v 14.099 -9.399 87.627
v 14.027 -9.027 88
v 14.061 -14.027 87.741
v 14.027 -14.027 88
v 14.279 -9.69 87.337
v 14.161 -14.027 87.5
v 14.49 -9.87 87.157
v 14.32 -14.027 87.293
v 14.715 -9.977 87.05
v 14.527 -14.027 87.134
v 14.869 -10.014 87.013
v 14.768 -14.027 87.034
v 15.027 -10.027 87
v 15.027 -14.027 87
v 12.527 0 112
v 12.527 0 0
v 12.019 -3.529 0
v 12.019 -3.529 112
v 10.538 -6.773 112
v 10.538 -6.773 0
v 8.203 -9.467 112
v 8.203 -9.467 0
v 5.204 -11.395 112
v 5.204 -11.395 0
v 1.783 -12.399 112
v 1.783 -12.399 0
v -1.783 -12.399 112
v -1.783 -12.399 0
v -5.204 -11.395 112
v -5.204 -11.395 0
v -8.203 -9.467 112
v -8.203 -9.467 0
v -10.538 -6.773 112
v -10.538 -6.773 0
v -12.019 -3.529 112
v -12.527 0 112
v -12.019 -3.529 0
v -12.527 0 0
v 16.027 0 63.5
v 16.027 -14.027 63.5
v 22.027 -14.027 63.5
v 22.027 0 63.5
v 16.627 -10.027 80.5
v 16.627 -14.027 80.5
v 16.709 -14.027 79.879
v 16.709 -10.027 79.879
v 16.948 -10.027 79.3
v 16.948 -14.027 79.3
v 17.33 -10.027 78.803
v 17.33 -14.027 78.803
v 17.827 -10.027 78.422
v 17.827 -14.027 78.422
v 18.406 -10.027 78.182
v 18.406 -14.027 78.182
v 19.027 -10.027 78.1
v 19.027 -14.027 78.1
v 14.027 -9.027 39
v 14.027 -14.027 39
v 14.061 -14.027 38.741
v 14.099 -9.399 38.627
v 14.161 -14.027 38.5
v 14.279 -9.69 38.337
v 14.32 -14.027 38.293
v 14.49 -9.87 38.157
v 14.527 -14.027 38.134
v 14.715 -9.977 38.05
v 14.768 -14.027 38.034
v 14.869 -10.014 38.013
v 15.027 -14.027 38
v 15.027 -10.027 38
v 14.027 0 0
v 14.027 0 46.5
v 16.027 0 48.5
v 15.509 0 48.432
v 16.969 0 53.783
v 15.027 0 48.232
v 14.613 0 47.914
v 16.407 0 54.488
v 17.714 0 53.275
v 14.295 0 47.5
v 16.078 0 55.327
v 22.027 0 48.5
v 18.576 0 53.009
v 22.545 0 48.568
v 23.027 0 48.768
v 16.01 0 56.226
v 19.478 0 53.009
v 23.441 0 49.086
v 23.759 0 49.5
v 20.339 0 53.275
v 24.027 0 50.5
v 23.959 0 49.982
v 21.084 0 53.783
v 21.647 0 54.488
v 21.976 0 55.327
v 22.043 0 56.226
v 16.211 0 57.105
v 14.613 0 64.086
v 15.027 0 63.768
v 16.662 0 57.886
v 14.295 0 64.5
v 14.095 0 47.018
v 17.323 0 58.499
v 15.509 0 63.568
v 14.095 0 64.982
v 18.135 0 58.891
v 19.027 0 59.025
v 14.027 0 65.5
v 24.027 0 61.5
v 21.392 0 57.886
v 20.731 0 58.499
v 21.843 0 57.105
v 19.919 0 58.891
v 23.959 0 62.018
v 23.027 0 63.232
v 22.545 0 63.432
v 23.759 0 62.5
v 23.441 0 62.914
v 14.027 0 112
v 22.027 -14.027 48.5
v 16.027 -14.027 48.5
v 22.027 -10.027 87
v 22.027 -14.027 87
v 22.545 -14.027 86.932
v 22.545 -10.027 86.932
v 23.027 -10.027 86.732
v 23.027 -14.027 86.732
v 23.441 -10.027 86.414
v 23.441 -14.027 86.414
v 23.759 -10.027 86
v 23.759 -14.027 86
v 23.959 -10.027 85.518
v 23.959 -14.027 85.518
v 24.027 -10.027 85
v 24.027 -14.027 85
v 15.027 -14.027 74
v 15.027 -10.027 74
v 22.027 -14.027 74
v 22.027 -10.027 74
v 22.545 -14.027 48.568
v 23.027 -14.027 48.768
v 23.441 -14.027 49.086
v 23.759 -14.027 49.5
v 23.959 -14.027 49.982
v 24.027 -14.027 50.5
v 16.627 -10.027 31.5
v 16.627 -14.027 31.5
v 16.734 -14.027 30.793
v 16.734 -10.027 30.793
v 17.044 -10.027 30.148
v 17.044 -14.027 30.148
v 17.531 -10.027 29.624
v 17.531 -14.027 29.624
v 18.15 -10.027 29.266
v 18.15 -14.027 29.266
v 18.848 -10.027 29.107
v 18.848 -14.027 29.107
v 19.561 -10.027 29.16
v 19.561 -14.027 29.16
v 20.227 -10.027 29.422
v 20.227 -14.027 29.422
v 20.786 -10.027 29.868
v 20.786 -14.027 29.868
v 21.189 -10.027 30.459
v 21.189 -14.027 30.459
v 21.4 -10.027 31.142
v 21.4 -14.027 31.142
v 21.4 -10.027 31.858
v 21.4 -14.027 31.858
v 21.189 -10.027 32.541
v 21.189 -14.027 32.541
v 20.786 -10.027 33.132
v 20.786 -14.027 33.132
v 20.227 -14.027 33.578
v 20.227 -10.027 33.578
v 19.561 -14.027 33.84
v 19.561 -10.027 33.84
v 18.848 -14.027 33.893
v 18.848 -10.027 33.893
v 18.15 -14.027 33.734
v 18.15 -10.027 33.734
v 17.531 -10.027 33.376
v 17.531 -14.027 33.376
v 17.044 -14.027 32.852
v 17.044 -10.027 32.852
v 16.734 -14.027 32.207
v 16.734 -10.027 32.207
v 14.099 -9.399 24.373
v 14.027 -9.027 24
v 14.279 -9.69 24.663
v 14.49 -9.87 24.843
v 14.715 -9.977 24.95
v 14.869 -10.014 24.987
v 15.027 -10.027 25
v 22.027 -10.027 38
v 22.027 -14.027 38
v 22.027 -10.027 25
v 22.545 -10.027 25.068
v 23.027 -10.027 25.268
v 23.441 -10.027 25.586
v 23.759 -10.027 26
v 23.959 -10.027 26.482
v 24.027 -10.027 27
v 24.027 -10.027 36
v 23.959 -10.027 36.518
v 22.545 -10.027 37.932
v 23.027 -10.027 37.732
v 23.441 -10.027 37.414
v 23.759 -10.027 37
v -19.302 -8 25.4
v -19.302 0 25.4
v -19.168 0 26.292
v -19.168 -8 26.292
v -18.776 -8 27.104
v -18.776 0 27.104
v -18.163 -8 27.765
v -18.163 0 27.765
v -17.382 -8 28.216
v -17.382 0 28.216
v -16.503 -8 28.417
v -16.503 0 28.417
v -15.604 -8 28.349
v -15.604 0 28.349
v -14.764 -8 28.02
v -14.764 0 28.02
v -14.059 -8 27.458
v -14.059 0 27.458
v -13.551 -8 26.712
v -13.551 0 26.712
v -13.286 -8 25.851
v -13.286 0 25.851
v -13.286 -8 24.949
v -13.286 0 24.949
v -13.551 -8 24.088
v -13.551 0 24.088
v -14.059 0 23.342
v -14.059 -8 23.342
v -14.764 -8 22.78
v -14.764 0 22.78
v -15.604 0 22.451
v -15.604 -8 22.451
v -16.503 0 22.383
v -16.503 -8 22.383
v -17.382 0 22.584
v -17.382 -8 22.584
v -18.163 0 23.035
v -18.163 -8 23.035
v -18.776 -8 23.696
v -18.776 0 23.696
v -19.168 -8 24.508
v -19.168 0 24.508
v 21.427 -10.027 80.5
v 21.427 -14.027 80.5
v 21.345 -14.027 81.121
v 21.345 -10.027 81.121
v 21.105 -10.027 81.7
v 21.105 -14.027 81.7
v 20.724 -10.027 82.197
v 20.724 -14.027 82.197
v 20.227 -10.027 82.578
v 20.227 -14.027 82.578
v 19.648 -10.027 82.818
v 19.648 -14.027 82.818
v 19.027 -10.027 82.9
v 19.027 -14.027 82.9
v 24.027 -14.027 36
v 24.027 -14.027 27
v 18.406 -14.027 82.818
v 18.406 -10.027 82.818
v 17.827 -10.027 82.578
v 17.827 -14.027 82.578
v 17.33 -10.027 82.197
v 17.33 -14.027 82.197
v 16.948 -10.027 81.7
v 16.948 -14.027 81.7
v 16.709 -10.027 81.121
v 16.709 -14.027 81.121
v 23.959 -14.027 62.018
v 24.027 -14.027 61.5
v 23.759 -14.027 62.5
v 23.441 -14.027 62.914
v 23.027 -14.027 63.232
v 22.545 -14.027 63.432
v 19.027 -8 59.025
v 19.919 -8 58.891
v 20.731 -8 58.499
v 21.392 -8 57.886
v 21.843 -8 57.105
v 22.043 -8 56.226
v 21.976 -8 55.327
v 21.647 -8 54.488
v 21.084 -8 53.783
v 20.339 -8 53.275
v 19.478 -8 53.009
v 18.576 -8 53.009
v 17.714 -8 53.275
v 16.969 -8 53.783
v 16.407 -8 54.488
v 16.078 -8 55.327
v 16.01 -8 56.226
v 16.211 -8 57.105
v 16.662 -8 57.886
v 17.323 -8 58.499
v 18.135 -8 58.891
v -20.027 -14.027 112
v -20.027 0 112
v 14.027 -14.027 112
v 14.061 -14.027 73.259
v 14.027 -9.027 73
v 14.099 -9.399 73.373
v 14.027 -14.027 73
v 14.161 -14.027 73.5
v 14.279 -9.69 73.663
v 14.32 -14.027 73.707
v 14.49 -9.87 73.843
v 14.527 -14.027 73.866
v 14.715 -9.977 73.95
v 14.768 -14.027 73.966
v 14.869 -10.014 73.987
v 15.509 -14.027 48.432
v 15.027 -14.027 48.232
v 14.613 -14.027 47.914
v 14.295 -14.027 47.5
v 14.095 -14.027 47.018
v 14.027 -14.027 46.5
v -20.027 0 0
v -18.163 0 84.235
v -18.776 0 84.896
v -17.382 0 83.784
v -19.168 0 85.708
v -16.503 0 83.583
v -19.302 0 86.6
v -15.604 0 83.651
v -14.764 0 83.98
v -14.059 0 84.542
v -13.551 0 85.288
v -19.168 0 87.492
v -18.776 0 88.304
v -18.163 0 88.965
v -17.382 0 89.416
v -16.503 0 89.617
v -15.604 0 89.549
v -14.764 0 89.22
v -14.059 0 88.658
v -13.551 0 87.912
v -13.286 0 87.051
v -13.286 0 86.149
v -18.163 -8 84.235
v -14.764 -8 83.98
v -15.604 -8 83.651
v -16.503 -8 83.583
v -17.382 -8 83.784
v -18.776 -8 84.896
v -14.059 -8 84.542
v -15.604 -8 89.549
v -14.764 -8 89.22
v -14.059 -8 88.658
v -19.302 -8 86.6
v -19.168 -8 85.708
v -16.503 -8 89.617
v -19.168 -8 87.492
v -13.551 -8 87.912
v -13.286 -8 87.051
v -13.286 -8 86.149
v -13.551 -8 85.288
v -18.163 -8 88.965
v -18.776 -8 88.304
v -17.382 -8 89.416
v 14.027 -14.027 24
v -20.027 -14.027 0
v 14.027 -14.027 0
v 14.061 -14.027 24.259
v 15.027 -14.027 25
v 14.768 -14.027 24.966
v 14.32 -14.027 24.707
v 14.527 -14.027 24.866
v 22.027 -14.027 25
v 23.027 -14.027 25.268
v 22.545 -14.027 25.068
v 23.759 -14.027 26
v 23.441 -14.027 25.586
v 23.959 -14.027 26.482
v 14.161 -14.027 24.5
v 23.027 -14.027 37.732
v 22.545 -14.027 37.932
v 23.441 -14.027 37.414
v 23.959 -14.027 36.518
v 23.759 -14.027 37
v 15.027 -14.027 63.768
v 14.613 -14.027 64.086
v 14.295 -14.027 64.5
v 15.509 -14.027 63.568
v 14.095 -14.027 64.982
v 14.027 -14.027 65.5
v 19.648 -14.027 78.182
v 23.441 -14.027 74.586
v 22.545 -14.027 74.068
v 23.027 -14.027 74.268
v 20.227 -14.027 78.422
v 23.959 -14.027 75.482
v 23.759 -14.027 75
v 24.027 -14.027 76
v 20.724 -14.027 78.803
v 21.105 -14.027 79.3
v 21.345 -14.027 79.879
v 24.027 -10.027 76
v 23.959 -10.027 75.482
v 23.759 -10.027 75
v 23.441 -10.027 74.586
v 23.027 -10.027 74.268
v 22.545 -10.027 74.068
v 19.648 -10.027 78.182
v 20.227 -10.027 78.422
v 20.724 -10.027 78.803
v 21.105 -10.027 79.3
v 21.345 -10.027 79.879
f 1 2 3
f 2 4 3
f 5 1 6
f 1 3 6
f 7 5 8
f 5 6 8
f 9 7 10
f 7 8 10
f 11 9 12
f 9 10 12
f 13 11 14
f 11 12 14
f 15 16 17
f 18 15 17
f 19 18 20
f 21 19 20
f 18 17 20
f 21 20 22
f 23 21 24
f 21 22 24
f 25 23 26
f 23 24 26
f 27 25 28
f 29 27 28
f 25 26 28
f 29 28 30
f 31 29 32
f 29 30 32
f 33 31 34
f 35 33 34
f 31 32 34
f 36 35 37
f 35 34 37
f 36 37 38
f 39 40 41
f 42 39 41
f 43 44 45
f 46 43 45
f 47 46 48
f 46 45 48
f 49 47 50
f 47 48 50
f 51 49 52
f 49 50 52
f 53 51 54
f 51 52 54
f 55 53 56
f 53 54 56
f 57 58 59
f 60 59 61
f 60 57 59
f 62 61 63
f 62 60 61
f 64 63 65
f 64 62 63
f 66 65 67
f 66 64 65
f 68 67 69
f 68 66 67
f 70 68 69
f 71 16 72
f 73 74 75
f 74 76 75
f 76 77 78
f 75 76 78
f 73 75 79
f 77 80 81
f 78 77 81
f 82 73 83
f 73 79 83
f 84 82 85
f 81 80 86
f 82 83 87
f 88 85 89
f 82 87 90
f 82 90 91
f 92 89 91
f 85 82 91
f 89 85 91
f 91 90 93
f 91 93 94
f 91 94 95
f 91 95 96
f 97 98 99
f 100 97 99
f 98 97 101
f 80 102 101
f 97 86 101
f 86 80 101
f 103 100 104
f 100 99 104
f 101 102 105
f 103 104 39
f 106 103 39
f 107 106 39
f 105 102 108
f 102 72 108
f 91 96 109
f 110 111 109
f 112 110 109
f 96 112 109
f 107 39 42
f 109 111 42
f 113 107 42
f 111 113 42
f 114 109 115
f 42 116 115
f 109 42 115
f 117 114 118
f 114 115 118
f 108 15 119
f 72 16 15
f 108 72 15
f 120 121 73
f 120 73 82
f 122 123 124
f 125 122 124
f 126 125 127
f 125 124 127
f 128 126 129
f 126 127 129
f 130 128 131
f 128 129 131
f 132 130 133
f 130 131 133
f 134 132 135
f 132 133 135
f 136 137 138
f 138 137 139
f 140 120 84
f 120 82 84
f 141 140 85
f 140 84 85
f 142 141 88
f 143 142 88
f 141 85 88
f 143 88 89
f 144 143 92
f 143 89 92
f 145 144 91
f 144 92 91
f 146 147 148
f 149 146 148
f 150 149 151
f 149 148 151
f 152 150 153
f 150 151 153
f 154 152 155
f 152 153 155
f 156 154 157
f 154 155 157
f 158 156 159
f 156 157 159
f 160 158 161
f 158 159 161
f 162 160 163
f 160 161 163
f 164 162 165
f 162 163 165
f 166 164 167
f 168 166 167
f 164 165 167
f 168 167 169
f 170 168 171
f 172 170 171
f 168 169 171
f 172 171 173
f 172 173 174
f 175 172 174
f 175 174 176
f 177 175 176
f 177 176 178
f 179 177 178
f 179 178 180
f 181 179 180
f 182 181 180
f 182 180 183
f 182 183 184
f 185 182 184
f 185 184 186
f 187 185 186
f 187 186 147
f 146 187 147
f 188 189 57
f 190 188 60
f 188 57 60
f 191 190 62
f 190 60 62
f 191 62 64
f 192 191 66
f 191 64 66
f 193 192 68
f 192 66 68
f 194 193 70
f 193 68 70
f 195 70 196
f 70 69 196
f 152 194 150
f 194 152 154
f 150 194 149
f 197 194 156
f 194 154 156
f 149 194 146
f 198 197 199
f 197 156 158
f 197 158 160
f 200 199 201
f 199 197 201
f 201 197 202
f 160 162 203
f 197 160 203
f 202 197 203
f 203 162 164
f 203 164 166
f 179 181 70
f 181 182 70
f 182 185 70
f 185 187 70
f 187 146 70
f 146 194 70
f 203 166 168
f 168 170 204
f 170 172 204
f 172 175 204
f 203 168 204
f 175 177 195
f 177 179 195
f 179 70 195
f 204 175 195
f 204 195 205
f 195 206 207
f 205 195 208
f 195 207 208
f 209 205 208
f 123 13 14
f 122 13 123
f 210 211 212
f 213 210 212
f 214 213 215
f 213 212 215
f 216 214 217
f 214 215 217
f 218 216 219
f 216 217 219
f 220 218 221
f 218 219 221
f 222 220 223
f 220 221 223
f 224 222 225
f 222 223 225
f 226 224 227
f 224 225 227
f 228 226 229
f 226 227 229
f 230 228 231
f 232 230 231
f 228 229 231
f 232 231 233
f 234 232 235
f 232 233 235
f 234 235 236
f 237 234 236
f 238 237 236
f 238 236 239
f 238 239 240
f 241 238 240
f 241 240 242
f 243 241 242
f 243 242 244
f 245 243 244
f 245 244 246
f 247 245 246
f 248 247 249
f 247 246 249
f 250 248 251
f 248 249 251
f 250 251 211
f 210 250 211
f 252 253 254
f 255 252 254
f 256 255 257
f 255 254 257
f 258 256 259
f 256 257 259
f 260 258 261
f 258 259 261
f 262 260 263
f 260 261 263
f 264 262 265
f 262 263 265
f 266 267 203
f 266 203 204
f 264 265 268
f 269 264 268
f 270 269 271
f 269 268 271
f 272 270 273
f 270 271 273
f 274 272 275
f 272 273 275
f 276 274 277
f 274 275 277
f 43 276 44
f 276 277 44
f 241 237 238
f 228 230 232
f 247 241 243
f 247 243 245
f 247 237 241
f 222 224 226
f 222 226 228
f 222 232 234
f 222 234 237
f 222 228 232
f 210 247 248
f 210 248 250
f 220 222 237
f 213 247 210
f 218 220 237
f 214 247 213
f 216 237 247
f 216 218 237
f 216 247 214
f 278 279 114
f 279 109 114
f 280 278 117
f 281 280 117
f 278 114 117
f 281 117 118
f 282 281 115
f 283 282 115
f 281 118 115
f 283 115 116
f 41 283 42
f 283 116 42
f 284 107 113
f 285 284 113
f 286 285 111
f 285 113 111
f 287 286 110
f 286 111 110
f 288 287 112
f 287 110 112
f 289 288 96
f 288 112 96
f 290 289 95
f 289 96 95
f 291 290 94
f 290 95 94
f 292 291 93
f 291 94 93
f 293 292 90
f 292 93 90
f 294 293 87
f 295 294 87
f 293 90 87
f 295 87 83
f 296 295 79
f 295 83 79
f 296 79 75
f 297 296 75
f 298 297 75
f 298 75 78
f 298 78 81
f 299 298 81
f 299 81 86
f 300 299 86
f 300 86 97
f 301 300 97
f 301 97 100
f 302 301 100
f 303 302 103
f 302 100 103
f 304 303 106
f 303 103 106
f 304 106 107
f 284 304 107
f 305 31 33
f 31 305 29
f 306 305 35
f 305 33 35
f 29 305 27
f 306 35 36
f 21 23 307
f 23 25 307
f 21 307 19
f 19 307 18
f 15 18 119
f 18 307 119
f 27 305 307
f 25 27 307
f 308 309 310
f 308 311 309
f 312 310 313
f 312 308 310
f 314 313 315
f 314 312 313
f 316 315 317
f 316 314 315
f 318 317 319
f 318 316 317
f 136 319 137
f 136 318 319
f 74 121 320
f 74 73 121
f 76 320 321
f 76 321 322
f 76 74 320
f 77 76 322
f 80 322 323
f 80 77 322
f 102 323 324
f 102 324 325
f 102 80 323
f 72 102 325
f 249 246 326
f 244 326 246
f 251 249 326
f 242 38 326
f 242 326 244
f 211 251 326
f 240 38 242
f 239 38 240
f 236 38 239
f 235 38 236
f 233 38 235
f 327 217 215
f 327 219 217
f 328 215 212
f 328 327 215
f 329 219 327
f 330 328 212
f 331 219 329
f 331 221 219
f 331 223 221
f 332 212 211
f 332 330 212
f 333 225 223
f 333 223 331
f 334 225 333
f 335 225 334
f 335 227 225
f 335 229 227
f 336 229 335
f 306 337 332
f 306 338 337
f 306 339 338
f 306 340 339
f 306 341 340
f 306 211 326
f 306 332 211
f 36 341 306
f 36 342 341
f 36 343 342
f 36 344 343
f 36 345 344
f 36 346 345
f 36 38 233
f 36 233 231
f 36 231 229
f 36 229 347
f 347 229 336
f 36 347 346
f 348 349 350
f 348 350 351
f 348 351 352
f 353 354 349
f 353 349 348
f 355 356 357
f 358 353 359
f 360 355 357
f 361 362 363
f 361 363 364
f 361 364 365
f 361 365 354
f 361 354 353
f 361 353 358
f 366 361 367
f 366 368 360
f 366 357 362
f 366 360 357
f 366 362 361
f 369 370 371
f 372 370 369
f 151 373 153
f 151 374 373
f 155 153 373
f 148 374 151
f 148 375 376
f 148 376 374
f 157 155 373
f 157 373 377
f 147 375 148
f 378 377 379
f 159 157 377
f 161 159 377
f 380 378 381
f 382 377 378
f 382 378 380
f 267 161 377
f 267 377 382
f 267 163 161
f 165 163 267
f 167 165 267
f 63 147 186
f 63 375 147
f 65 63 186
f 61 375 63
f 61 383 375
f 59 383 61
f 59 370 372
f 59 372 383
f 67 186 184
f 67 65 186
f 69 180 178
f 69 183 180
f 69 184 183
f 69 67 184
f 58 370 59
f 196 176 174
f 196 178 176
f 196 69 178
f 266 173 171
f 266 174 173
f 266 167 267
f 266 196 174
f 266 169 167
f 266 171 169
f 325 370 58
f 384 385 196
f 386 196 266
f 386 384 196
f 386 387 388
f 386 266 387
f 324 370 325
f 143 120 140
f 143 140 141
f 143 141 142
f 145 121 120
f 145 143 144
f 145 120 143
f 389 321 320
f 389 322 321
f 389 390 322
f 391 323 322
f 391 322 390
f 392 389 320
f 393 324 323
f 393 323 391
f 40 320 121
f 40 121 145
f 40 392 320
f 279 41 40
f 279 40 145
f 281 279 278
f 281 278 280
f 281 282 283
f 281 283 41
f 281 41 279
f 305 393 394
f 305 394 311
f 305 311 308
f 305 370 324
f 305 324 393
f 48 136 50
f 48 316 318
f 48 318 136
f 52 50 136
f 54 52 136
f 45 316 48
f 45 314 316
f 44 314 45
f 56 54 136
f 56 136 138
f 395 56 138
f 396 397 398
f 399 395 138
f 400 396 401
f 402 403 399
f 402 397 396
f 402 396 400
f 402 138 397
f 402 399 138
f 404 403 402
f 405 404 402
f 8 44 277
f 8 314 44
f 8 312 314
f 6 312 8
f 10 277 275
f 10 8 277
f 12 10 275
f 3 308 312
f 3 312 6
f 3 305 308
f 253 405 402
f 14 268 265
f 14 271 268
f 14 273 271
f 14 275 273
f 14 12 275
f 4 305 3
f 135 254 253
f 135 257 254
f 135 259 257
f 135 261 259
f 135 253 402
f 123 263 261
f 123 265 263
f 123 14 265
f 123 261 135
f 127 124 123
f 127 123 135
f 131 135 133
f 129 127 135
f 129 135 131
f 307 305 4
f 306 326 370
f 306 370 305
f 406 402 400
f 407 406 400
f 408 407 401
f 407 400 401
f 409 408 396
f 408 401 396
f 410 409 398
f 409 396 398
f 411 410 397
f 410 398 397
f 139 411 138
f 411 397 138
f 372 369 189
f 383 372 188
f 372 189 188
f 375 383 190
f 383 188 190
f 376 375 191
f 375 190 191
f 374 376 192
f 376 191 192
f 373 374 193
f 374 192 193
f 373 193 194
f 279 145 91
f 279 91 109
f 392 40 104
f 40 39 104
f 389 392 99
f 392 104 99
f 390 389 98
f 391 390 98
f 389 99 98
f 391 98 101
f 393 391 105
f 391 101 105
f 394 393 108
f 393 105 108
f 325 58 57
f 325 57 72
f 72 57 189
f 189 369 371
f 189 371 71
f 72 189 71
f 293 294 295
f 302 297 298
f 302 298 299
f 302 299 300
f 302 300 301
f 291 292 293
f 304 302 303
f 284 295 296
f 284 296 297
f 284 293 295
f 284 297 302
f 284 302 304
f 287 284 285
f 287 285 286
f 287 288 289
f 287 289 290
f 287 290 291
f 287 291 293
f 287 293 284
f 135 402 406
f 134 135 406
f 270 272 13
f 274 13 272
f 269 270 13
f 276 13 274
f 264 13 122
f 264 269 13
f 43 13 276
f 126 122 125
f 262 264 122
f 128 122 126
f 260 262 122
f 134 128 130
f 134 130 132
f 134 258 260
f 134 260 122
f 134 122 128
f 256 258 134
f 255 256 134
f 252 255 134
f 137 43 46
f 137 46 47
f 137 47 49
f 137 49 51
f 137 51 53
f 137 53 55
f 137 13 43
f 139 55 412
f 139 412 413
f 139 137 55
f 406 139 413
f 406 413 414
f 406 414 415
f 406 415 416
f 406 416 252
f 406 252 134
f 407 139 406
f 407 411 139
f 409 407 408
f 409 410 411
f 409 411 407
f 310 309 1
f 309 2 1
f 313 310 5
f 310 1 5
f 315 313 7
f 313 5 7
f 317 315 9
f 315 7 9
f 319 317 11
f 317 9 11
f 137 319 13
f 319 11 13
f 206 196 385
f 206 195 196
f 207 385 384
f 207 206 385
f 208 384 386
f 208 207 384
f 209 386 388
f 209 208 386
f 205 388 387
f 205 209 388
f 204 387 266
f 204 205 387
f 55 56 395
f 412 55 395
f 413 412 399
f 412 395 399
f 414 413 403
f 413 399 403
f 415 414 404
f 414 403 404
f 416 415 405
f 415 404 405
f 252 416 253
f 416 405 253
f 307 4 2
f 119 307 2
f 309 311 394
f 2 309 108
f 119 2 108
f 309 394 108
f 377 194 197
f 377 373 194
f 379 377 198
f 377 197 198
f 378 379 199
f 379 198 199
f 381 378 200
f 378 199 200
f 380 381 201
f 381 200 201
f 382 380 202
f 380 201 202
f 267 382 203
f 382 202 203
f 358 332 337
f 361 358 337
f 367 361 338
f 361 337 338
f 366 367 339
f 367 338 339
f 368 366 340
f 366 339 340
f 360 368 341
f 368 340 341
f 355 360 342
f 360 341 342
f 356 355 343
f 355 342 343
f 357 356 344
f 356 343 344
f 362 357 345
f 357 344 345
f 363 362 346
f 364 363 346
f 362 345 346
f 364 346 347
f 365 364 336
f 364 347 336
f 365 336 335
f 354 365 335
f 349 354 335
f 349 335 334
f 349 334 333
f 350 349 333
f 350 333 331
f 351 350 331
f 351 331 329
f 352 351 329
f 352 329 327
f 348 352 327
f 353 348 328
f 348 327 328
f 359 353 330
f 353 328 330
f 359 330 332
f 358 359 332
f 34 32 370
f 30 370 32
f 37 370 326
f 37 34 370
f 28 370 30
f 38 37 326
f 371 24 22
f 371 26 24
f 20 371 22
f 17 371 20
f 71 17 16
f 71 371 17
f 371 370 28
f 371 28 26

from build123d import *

# Parameters (mm, degrees)
BOSS_EXTRUDE1_DEPTH  = 112
SKETCH3_W            = 11
SKETCH3_H            = 11
BOSS_EXTRUDE2_DEPTH  = 4
BOSS_EXTRUDE3_REACH  = 127.251
SKETCH8_W            = 10
SKETCH8_H            = 13
BOSS_EXTRUDE4_DEPTH  = 4
FILLET1_R            = 2
M4_CLEARANCE_HOLE1_D = 4.8
MIRROR1_START        = 13.844633107
MIRROR1_OUTLINE_W    = 4
MIRROR1_OUTLINE_H    = 13
MIRROR1_DEPTH        = 2.782266793
MIRROR1_START_2      = 21.4269001
MIRROR1_2_OUTLINE_W  = 4
MIRROR1_2_OUTLINE_H  = 13
MIRROR1_2_DEPTH      = 0.5999999
MIRROR1_START_3      = 74
MIRROR1_3_DEPTH      = 13
MIRROR1_4_OUTLINE_W  = 4.8000002
MIRROR1_4_OUTLINE_H  = 4
MIRROR1_4_DEPTH      = 4.0999999
MIRROR1_START_4      = 82.9000001
MIRROR1_5_OUTLINE_W  = 4.8000002
MIRROR1_5_OUTLINE_H  = 4
MIRROR1_5_DEPTH      = 4.0999999
MIRROR1_START_5      = 76
MIRROR1_6_OUTLINE_W  = 2
MIRROR1_6_OUTLINE_H  = 4
MIRROR1_6_DEPTH      = 9
MIRROR1_START_6      = -14.0269
MIRROR1_7_DEPTH      = 4
CUT_EXTRUDE2_DEPTH   = 126.72521882
BOSS_EXTRUDE5_START  = -87
BOSS_EXTRUDE5_DEPTH  = 112
SKETCH14_W           = 112
SKETCH14_H           = 14.0269
BOSS_EXTRUDE6_DEPTH  = 1
SKETCH2_R            = 3.025
CUT_EXTRUDE1_DEPTH   = 8
SKETCH15_W           = 10
SKETCH15_H           = 15
SKETCH15_R           = 3.025
BOSS_EXTRUDE7_DEPTH  = 14.0269
SKETCH16_R           = 3.025
CUT_EXTRUDE3_DEPTH   = 8
FILLET2_R            = 2
FILLET3_R            = 1


with BuildPart() as part:
    # Sketch1 → Boss-Extrude1 (new body)
    with BuildSketch(Plane.XY):
        with BuildLine():
            ThreePointArc((0, -14.0269), (-9.918516109, -9.918516109), (-14.0269, 0))
            Line((-14.0269, 0), (-19.0269, 0))
            Line((-19.0269, 0), (-19.0269, -14.0269))
            Line((-19.0269, -14.0269), (0, -14.0269))
        make_face()
        with BuildLine():
            Line((-12.5269, 0), (-14.0269, 0))
            ThreePointArc((-14.0269, 0), (-9.918516109, -9.918516109), (0, -14.0269))
            ThreePointArc((0, -14.0269), (9.918516109, -9.918516109), (14.0269, 0))
            Line((14.0269, 0), (12.5269, 0))
            ThreePointArc((12.5269, 0), (0, -12.5269), (-12.5269, 0))
        make_face()
    extrude(amount=BOSS_EXTRUDE1_DEPTH)

    # Sketch3 → Boss-Extrude2 (add)
    with BuildSketch(Plane.XZ.offset(14.0269)):
        with Locations((-13.5269, 117.5)):
            Rectangle(SKETCH3_W, SKETCH3_H)
    extrude(amount=-BOSS_EXTRUDE2_DEPTH)

    # Sketch7 → Boss-Extrude3 (add, up to next)
    with BuildSketch(Plane.XZ.offset(14.0269), mode=Mode.PRIVATE) as boss_extrude3_sk1:
        Polygon((0, 25), (14.0269, 25), (14.0269, 31.5), (14.0269, 38), (0, 38), align=None)
    boss_extrude3_tool1 = extrude(boss_extrude3_sk1.sketch, amount=-BOSS_EXTRUDE3_REACH, mode=Mode.PRIVATE) - part.part
    add(boss_extrude3_tool1.solids().sort_by_distance((7.01345, -14.0269, 31.5))[0])

    # Sketch8 → Boss-Extrude4 (add)
    with BuildSketch(Plane.XZ.offset(14.0269)):
        with Locations((19.0269, 31.5)):
            Rectangle(SKETCH8_W, SKETCH8_H)
    extrude(amount=-BOSS_EXTRUDE4_DEPTH)

    # Fillet1
    fillet1_edges = [part.edges().sort_by_distance(p)[0] for p in [
        (-19.0269, -12.0269, 123),
        (-8.0269, -12.0269, 123),
        (24.0269, -12.0269, 38),
        (24.0269, -12.0269, 25),
    ]]
    fillet(fillet1_edges, radius=FILLET1_R)

    # M4 Clearance Hole1 (through all)
    with Locations(Plane(origin=(0, -10.0269, 0), x_dir=(1, 0, 0), z_dir=(0, 1, 0))):
        with Locations((-13.5269, -117.5), (19.0269, -31.5)):
            Hole(M4_CLEARANCE_HOLE1_D / 2)



with BuildPart() as body_2:
    # Mirror1: read off the stored shape, not the designer's step
    # Mirror1 outline → Mirror1 (new body)
    with BuildSketch(Plane.YZ.offset(MIRROR1_START)):
        with Locations((-12.0269, 80.5)):
            Rectangle(MIRROR1_OUTLINE_W, MIRROR1_OUTLINE_H)
    extrude(amount=MIRROR1_DEPTH)


with BuildPart() as body_3:
    # Mirror1 2 outline → Mirror1 2 (new body)
    with BuildSketch(Plane.YZ.offset(MIRROR1_START_2)):
        with Locations((-12.0269, 80.5)):
            Rectangle(MIRROR1_2_OUTLINE_W, MIRROR1_2_OUTLINE_H)
    extrude(amount=MIRROR1_2_DEPTH)


with BuildPart() as part_1:
    add(part.part)

    add(body_2.part)  # Mirror1 3 merges body 2
    # Mirror1 3 outline → Mirror1 3 (add)
    with BuildSketch(Plane.XY.offset(MIRROR1_START_3)):
        with BuildLine():
            Line((16.6268999, -10.0269), (14.0269, -10.0269))
            Line((14.0269, -10.0269), (14.0269, 0))
            ThreePointArc((14.0269, 0), (9.918516109, -9.918516109), (0, -14.0269))
            Line((0, -14.0269), (13.844633107, -14.0269))
            Line((13.844633107, -14.0269), (16.6268999, -14.0269))
            Line((16.6268999, -14.0269), (16.6268999, -10.0269))
        make_face()
    extrude(amount=MIRROR1_3_DEPTH)


    add(body_3.part)  # Mirror1 4 merges body 3
    # Mirror1 4 outline → Mirror1 4 (add)
    with BuildSketch(Plane.XY.offset(MIRROR1_START_3)):
        with Locations((19.0269, -12.0269)):
            Rectangle(MIRROR1_4_OUTLINE_W, MIRROR1_4_OUTLINE_H)
    extrude(amount=MIRROR1_4_DEPTH)

    # Mirror1 5 outline → Mirror1 5 (add)
    with BuildSketch(Plane.XY.offset(MIRROR1_START_4)):
        with Locations((19.0269, -12.0269)):
            Rectangle(MIRROR1_5_OUTLINE_W, MIRROR1_5_OUTLINE_H)
    extrude(amount=MIRROR1_5_DEPTH)

    # Mirror1 6 outline → Mirror1 6 (add)
    with BuildSketch(Plane.XY.offset(MIRROR1_START_5)):
        with Locations((23.0269, -12.0269)):
            Rectangle(MIRROR1_6_OUTLINE_W, MIRROR1_6_OUTLINE_H)
    extrude(amount=MIRROR1_6_DEPTH)

    # Mirror1 7 outline → Mirror1 7 (add)
    with BuildSketch(Plane(origin=(0, 0, 0), x_dir=(1, 0, 0), z_dir=(0, 1, 0)).offset(MIRROR1_START_6)):
        with BuildLine():
            ThreePointArc((24.0269, -76), (23.441113562, -74.585786438), (22.0269, -74))
            Line((22.0269, -74), (22.0269, -76))
            Line((22.0269, -76), (24.0269, -76))
        make_face()
        with BuildLine():
            Line((22.0269, -85), (22.0269, -87))
            ThreePointArc((22.0269, -87), (23.441113562, -86.414213562), (24.0269, -85))
            Line((24.0269, -85), (22.0269, -85))
        make_face()
        with BuildLine():
            Line((21.4269001, -82.9000001), (21.4269, -80.5))
            ThreePointArc((21.4269, -80.5), (20.723956275, -82.197056275), (19.0269, -82.9))
            Line((19.0269, -82.9), (21.4269001, -82.9000001))
        make_face()
        with BuildLine():
            ThreePointArc((19.0269, -78.1), (20.723956275, -78.802943725), (21.4269, -80.5))
            Line((21.4269, -80.5), (21.4269001, -78.0999999))
            Line((21.4269001, -78.0999999), (19.0269, -78.1))
        make_face()
        with BuildLine():
            ThreePointArc((16.6269, -80.5), (17.329843725, -78.802943725), (19.0269, -78.1))
            Line((19.0269, -78.1), (16.6268999, -78.0999999))
            Line((16.6268999, -78.0999999), (16.6269, -80.5))
        make_face()
        with BuildLine():
            Line((16.6268999, -82.9000001), (19.0269, -82.9))
            ThreePointArc((19.0269, -82.9), (17.329843725, -82.197056275), (16.6269, -80.5))
            Line((16.6269, -80.5), (16.6268999, -82.9000001))
        make_face()
    extrude(amount=MIRROR1_7_DEPTH)

    # Sketch12 → Cut-Extrude2 (cut, through all)
    with BuildSketch(Plane(origin=(0, -10.0269, 0), x_dir=(1, 0, 0), z_dir=(0, 1, 0))):
        with BuildLine():
            Line((-19.0269, -112), (-19.0269, -121))
            ThreePointArc((-19.0269, -121), (-18.441113562, -122.414213562), (-17.0269, -123))
            Line((-17.0269, -123), (-10.0269, -123))
            ThreePointArc((-10.0269, -123), (-8.612686438, -122.414213562), (-8.0269, -121))
            Line((-8.0269, -121), (-8.0269, -112))
            Line((-8.0269, -112), (-19.0269, -112))
        make_face()
    extrude(amount=-CUT_EXTRUDE2_DEPTH, mode=Mode.SUBTRACT)

    # Sketch13 → Boss-Extrude5 (add)
    with BuildSketch(Plane.XY.offset(87).offset(BOSS_EXTRUDE5_START)):
        with BuildLine():
            Line((14.0269, -14.0269), (14.0269, -10.0269))
            Line((14.0269, -10.0269), (14.0269, 0))
            ThreePointArc((14.0269, 0), (9.918516109, -9.918516109), (0, -14.0269))
            Line((0, -14.0269), (14.0269, -14.0269))
        make_face()
    extrude(amount=BOSS_EXTRUDE5_DEPTH)

    # Sketch14 → Boss-Extrude6 (add)
    with BuildSketch(Plane.ZY.offset(19.0269)):
        with Locations((56, -7.01345)):
            Rectangle(SKETCH14_W, SKETCH14_H)
    extrude(amount=BOSS_EXTRUDE6_DEPTH)

    # Sketch2 → Cut-Extrude1 (cut)
    with BuildSketch(Plane(origin=(0, 0, 0), x_dir=(1, 0, 0), z_dir=(0, 1, 0))):
        with Locations(Location((-16.2769, -25.4, 0), (0, 0, 180))):
            Circle(SKETCH2_R)
        with Locations(Location((-16.2769, -86.6, 0), (0, 0, 180))):
            Circle(SKETCH2_R)
    extrude(amount=-CUT_EXTRUDE1_DEPTH, mode=Mode.SUBTRACT)

    # Sketch15 → Boss-Extrude7 (add)
    # profile 1 of 2: a face of its own
    with BuildSketch(Plane.XZ.offset(14.0269)):
        with Locations((19.0269, 56)):
            Rectangle(SKETCH15_W, SKETCH15_H)
        with Locations((19.0269, 56)):
            Circle(SKETCH15_R, mode=Mode.SUBTRACT)
    # profile 2 of 2: a face of its own
    with BuildSketch(Plane.XZ.offset(14.0269)):
        with Locations((19.0269, 56)):
            Circle(SKETCH15_R)
    extrude(amount=-BOSS_EXTRUDE7_DEPTH)

    # Sketch16 → Cut-Extrude3 (cut)
    with BuildSketch(Plane(origin=(0, 0, 0), x_dir=(1, 0, 0), z_dir=(0, 1, 0))):
        with Locations(Location((19.0269, -56, 0), (0, 0, 270))):
            Circle(SKETCH16_R)
    extrude(amount=-CUT_EXTRUDE3_DEPTH, mode=Mode.SUBTRACT)

    # Fillet2
    fillet2_edges = [part_1.edges().sort_by_distance(p)[0] for p in [
        (24.0269, -7.01345, 63.5),
        (24.0269, -7.01345, 48.5),
        (14.0269, -7.01345, 48.5),
        (14.0269, -7.01345, 63.5),
    ]]
    fillet(fillet2_edges, radius=FILLET2_R)

    # Fillet3
    fillet3_edges = [part_1.edges().sort_by_distance(p)[0] for p in [
        (14.0269, -10.0269, 80.5),
        (14.0269, -12.0269, 25),
        (14.0269, -12.0269, 38),
        (14.0269, -12.0269, 74),
        (14.0269, -12.0269, 87),
        (14.0269, -10.0269, 31.5),
    ]]
    fillet(fillet3_edges, radius=FILLET3_R)


solid = part_1.part
